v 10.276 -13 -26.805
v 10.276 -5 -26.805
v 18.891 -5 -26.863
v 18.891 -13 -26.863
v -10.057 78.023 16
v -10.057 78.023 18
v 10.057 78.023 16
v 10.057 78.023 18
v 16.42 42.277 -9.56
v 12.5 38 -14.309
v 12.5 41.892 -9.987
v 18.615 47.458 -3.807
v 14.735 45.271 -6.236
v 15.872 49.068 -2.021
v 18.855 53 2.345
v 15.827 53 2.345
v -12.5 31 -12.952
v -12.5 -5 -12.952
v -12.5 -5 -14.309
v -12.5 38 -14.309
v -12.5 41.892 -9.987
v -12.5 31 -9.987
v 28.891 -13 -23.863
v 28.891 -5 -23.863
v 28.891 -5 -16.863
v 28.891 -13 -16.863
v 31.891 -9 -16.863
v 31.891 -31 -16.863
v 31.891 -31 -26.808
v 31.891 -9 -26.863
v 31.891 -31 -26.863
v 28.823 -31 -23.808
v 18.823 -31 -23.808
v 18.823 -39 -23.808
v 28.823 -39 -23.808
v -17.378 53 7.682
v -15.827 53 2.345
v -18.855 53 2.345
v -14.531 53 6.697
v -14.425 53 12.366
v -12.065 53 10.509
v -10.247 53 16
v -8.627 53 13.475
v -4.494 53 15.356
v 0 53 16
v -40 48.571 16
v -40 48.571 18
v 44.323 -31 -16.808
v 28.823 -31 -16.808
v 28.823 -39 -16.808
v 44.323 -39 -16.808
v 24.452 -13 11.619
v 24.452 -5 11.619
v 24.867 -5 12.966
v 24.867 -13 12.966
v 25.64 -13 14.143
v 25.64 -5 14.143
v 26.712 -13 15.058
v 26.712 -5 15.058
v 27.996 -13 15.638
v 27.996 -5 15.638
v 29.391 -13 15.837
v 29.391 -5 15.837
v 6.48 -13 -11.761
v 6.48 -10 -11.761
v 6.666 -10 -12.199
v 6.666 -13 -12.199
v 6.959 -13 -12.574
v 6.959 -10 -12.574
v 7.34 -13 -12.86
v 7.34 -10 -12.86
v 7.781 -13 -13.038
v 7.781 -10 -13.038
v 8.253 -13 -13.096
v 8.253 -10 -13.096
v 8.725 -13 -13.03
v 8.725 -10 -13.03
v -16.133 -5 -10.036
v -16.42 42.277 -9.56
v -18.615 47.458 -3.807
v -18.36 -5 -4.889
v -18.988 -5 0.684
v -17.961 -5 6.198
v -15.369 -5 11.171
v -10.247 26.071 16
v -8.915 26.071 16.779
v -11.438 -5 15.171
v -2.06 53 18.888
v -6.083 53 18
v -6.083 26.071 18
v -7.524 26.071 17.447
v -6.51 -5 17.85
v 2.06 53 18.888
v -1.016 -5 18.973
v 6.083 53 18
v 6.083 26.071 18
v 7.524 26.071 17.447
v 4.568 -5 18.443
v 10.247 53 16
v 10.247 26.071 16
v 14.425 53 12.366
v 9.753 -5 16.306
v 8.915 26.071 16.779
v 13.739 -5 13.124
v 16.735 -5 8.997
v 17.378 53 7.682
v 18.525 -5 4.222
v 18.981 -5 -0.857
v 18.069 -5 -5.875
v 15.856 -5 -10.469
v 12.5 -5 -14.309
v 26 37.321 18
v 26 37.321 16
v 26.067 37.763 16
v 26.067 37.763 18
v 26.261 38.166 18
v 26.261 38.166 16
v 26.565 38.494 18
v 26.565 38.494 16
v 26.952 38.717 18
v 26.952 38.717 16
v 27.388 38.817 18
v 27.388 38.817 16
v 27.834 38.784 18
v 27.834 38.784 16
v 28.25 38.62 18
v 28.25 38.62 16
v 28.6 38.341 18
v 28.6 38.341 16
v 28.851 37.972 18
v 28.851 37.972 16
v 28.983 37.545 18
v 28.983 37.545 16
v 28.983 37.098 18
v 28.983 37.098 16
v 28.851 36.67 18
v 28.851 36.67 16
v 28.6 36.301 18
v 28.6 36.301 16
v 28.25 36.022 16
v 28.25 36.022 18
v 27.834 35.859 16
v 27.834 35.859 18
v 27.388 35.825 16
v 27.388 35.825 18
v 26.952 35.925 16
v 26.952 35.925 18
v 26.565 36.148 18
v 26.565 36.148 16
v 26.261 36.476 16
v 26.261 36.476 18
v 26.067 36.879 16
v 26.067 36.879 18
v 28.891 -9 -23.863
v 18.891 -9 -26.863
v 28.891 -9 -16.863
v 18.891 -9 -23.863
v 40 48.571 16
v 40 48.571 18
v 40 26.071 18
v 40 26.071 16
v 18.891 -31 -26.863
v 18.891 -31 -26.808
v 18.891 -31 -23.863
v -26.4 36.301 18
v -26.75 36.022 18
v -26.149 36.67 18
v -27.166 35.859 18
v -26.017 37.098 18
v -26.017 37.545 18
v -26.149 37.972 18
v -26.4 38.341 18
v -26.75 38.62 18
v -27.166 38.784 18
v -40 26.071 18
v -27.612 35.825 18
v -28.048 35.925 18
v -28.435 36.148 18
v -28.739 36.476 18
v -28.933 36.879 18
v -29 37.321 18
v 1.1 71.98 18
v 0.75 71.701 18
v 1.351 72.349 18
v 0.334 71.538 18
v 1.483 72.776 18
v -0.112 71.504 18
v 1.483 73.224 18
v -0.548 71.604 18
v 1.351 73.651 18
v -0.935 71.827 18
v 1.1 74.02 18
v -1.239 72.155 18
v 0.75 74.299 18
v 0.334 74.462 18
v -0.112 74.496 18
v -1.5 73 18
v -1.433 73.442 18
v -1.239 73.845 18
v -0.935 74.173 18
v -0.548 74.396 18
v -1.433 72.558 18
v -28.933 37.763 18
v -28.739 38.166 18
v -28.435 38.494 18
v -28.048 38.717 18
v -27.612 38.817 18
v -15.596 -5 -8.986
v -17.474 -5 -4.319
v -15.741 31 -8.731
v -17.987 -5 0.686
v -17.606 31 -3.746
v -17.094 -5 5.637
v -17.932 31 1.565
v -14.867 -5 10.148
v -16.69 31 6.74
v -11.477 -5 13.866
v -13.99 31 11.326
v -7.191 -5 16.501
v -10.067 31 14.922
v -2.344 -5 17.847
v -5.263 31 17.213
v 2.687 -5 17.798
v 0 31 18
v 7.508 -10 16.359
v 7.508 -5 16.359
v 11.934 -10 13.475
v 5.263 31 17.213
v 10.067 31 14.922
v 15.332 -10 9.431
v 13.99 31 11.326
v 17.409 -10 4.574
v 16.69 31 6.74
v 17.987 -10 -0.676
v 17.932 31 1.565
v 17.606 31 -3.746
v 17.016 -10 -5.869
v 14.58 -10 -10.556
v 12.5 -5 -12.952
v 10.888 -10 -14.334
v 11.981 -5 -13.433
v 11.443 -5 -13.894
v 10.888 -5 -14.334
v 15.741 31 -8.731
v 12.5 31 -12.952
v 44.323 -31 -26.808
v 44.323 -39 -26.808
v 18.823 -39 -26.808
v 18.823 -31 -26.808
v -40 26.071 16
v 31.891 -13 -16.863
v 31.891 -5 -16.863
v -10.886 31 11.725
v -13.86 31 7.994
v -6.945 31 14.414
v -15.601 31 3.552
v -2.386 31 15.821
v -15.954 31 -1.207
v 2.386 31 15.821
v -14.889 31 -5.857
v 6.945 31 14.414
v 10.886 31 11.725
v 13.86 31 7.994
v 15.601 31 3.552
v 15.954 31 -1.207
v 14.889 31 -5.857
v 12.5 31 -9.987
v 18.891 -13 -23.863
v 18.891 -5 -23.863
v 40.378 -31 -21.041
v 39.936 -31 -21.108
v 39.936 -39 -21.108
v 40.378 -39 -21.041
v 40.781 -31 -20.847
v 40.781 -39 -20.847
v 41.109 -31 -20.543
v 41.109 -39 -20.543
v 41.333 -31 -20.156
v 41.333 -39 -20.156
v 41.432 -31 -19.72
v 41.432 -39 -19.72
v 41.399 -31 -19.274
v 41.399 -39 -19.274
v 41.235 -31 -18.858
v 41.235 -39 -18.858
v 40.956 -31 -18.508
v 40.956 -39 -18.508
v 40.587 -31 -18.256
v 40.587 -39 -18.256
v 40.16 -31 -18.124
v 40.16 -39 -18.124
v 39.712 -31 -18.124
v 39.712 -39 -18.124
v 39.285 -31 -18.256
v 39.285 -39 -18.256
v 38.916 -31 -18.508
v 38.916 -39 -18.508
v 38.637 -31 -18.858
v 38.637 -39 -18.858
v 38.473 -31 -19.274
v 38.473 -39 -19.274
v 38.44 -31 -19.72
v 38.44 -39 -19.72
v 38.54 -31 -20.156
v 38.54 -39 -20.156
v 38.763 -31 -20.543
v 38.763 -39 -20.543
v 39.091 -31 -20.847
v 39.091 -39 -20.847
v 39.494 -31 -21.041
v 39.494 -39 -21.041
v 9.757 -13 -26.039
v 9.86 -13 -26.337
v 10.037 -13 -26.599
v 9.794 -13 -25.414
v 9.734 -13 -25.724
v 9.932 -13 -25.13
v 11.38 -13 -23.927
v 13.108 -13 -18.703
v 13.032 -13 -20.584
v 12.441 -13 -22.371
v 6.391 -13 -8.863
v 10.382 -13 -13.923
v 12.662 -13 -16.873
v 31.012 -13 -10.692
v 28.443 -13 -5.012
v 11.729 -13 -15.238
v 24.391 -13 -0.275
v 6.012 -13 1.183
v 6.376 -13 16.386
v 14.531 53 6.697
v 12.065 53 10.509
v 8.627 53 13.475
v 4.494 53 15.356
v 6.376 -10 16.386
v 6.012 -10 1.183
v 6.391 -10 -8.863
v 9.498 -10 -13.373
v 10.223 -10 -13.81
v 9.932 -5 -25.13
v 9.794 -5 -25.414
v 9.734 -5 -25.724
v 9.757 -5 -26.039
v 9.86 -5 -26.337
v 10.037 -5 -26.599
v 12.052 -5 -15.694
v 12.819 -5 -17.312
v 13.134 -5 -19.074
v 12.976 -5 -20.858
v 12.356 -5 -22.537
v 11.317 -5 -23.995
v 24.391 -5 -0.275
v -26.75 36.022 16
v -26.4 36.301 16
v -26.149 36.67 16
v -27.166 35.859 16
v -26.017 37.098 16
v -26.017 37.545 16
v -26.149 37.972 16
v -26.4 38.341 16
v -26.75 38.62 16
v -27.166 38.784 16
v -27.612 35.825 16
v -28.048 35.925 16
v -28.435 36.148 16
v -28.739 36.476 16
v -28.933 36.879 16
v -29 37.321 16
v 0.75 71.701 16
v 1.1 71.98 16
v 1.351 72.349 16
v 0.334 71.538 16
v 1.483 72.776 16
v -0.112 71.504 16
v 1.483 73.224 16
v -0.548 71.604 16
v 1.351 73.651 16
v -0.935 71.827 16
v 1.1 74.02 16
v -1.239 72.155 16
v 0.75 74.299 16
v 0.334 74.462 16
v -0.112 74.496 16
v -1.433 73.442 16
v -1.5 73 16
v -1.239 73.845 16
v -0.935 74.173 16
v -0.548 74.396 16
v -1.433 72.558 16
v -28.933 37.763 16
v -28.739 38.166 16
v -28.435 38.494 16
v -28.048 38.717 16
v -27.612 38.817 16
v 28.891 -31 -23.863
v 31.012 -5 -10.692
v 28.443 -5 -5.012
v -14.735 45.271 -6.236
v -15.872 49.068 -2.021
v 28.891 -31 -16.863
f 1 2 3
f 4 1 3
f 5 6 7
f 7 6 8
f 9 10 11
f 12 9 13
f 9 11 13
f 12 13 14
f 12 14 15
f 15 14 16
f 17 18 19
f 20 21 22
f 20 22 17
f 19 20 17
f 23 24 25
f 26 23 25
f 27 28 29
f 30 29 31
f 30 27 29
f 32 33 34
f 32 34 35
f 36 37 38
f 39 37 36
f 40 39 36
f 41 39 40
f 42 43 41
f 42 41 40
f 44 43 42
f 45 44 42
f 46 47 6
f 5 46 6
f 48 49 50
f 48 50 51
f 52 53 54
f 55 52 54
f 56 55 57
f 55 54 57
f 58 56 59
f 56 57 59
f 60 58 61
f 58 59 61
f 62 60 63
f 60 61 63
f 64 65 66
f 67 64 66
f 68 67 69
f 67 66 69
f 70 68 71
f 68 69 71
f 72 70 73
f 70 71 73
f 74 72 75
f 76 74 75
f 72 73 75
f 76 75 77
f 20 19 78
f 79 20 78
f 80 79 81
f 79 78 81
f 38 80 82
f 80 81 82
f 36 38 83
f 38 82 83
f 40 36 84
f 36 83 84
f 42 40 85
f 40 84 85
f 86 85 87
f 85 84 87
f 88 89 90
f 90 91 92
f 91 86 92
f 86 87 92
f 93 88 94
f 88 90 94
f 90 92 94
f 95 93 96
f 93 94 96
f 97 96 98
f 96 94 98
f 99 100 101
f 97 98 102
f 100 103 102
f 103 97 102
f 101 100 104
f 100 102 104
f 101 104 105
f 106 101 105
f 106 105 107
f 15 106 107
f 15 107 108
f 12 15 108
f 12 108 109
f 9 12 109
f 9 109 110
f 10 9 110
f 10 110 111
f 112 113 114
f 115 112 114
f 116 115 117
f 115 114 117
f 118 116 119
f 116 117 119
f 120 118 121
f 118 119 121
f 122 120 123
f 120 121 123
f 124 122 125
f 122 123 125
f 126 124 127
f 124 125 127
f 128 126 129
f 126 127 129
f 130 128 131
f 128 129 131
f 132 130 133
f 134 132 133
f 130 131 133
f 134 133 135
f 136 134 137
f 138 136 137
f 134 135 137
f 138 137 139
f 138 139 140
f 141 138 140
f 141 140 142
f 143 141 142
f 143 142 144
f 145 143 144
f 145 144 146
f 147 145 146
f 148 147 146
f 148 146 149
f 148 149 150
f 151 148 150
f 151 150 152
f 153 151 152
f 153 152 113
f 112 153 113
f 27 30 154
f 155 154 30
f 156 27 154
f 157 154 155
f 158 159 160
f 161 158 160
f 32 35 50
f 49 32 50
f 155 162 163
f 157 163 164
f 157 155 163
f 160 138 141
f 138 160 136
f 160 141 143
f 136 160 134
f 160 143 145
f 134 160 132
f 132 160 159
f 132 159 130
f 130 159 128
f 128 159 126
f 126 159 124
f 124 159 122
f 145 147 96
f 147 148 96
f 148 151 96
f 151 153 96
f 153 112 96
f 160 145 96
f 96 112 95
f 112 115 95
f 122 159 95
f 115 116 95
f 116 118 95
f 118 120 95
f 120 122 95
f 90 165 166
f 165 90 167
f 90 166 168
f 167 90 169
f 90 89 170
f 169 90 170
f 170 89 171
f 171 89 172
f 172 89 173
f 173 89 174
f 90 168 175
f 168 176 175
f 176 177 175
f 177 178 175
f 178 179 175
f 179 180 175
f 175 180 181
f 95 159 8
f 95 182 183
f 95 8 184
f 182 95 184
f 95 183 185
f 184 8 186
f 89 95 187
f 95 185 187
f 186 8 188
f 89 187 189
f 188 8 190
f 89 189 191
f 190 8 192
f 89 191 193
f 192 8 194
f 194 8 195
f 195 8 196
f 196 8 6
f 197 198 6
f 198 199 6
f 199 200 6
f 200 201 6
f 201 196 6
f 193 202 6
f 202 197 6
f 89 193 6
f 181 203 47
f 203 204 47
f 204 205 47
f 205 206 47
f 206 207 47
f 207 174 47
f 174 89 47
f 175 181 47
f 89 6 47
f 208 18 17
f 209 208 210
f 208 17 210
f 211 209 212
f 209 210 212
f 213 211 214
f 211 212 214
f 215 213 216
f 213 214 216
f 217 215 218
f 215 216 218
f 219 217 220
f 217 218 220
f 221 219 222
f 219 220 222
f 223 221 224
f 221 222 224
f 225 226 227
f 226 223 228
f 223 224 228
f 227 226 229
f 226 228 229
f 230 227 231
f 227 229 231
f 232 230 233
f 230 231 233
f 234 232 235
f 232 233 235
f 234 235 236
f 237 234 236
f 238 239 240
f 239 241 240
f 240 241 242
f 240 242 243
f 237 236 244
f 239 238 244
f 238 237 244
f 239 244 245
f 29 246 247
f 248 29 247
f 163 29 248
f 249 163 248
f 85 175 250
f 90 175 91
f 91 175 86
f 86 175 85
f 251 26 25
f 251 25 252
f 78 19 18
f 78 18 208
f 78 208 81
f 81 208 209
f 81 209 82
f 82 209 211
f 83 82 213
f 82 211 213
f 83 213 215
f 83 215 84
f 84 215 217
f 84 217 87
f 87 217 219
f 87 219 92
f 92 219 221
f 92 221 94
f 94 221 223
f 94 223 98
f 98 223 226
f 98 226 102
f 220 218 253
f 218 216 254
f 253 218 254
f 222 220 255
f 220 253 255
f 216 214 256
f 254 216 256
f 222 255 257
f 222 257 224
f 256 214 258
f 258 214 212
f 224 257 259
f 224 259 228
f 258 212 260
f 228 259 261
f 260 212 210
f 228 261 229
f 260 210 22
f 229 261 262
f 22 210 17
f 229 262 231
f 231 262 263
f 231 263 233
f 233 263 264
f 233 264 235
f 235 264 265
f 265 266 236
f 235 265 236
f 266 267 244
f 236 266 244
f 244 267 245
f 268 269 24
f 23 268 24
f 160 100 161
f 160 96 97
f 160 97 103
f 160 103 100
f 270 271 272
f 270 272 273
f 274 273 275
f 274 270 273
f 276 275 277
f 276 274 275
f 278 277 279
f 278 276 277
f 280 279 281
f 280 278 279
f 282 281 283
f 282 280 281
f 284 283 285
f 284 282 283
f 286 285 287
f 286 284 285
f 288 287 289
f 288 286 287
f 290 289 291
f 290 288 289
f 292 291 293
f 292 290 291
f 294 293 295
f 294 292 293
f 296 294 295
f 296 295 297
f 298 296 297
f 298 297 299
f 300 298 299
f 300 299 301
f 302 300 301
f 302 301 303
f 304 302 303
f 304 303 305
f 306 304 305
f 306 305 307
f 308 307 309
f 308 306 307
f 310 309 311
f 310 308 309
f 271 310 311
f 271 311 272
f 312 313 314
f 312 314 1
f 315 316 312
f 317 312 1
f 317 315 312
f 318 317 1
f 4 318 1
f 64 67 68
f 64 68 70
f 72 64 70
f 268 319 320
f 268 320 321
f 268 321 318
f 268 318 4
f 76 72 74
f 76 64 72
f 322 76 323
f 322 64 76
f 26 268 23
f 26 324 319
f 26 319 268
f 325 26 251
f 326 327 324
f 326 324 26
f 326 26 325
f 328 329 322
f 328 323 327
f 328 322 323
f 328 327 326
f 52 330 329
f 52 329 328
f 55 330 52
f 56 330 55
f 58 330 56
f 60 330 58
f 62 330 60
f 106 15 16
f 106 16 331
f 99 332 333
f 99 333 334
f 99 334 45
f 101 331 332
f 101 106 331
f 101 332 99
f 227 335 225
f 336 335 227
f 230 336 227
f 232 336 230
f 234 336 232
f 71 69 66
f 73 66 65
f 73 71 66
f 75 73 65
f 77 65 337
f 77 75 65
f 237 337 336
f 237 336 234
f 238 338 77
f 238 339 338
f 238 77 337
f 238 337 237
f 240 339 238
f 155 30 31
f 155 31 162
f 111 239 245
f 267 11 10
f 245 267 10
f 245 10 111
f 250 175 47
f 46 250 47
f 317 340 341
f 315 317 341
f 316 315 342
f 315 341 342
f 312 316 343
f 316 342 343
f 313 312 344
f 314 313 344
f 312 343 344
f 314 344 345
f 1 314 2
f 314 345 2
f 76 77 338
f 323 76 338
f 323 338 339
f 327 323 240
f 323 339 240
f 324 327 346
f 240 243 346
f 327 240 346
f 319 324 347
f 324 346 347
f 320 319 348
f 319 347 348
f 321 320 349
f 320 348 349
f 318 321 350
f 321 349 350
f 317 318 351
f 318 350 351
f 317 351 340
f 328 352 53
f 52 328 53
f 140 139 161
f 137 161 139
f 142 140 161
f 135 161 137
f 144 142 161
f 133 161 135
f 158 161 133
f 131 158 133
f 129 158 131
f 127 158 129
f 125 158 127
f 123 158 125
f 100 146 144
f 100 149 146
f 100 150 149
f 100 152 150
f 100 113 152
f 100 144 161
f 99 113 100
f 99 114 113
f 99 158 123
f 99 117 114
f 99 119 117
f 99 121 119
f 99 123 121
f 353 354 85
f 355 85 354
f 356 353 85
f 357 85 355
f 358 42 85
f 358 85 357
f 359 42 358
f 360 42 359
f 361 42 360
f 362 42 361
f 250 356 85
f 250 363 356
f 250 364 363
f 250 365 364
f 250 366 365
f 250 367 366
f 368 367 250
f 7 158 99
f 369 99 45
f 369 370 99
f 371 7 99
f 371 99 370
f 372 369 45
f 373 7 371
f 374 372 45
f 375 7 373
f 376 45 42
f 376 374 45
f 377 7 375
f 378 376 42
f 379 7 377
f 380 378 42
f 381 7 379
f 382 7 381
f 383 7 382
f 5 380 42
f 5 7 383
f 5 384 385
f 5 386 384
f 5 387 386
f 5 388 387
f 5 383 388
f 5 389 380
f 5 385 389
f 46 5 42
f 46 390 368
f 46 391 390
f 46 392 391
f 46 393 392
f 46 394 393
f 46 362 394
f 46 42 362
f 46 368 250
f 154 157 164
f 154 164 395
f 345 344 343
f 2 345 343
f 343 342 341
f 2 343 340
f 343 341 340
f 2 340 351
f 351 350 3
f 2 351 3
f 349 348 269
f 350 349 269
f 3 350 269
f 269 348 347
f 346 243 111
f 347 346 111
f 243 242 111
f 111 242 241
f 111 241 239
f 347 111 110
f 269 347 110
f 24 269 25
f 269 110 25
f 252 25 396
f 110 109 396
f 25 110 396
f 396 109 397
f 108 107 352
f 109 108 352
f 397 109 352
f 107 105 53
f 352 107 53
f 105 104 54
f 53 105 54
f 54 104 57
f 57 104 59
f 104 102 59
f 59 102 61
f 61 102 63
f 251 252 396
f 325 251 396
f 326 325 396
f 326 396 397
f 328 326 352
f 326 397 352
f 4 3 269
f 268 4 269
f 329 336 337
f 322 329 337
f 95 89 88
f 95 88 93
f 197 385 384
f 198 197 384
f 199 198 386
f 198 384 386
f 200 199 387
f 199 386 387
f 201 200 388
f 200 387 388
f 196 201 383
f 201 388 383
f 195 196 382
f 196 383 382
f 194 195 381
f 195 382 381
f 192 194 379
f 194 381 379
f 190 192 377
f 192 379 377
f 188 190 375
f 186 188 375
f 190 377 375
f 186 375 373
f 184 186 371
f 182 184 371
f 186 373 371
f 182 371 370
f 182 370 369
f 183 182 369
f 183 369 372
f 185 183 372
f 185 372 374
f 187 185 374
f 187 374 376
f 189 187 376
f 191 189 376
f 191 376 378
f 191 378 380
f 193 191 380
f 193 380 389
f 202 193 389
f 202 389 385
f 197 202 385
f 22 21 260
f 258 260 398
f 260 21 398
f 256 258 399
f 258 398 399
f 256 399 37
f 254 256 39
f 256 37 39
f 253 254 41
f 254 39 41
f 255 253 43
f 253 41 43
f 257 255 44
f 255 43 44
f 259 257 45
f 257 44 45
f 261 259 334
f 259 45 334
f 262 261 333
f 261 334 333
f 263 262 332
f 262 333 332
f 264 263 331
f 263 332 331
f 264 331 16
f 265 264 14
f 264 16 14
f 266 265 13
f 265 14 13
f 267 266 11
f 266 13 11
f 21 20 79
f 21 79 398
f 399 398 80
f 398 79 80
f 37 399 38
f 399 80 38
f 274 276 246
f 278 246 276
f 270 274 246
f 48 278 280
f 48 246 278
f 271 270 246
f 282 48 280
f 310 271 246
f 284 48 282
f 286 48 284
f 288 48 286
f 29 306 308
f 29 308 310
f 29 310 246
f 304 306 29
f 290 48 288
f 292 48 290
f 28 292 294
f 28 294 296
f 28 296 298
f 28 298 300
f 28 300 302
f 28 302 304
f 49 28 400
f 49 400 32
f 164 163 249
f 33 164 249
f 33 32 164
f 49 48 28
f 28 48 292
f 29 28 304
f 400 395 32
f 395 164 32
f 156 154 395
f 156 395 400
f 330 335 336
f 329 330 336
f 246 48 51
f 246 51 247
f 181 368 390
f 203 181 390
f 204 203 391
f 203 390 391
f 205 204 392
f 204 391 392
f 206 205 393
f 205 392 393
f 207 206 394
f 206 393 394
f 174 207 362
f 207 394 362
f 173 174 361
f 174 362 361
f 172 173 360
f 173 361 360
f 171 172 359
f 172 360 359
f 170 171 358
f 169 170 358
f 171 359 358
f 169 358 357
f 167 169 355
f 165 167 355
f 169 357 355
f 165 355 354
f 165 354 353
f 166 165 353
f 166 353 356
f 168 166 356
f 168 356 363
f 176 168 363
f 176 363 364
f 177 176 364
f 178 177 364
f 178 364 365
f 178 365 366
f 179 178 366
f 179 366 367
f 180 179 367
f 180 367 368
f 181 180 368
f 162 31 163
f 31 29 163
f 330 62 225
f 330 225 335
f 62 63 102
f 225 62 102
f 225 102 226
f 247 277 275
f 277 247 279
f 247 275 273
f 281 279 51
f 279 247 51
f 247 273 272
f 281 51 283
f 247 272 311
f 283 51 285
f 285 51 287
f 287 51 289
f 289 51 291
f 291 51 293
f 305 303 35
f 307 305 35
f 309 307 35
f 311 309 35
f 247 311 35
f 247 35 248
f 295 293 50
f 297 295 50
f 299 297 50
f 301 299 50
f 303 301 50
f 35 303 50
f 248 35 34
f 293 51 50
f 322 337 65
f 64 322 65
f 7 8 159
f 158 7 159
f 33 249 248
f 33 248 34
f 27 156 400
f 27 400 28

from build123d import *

# Parameters (mm, degrees)
BOSS_EXTRUDE1_DEPTH      = 53
BOSS_EXTRUDE1_DEPTH_BACK = 5
SKETCH1_R                = 19
SKETCH2_R                = 16
CUT_EXTRUDE1_DEPTH       = 22
SKETCH3_W                = 25
SKETCH3_H                = 20
CUT_EXTRUDE2_DEPTH       = 108
CUT_EXTRUDE3_DEPTH       = 108
CUT_EXTRUDE3_DEPTH_BACK  = 108
BOSS_EXTRUDE2_DEPTH      = 2
SKETCH10_R               = 1.5
CUT_EXTRUDE4_DEPTH       = 16
BOSS_EXTRUDE3_DEPTH      = 8
BOSS_EXTRUDE5_DEPTH      = 18
BOSS_EXTRUDE5_DEPTH_BACK = 4
SKETCH13_R               = 1.500172947
BOSS_EXTRUDE6_DEPTH      = 8
SKETCH16_R               = 18
CUT_EXTRUDE5_DEPTH       = 41


with BuildPart() as part:
    # Sketch1 → Boss-Extrude1 (new, two sides: drawn at the far end of the back side and taken through both)
    with BuildSketch(Plane(origin=(0, 0, 0), x_dir=(1, 0, 0), z_dir=(0, 1, 0)).offset(-BOSS_EXTRUDE1_DEPTH_BACK)):
        with Locations(Location((0, 0, 0), (0, 0, 270))):
            Circle(SKETCH1_R)
    extrude(amount=BOSS_EXTRUDE1_DEPTH + BOSS_EXTRUDE1_DEPTH_BACK)

    # Sketch2 → Cut-Extrude1 (cut)
    with BuildSketch(Plane(origin=(0, 53, 0), x_dir=(1, 0, 0), z_dir=(0, 1, 0))):
        with Locations(Location((0, 0, 0), (0, 0, 270))):
            Circle(SKETCH2_R)
    extrude(amount=-CUT_EXTRUDE1_DEPTH, mode=Mode.SUBTRACT)

    # Sketch3 → Cut-Extrude2 (cut)
    with BuildSketch(Plane(origin=(0, 53, 0), x_dir=(1, 0, 0), z_dir=(0, 1, 0))):
        with Locations((0, 16)):
            Rectangle(SKETCH3_W, SKETCH3_H)
    extrude(amount=-CUT_EXTRUDE2_DEPTH, mode=Mode.SUBTRACT)

    # Sketch7 → Cut-Extrude3 (cut, two sides: drawn at the far end of the back side and taken through both)
    with BuildSketch(Plane(origin=(0, 0, 0), x_dir=(0, 0, -1), z_dir=(1, 0, 0)).offset(-CUT_EXTRUDE3_DEPTH_BACK)):
        Polygon((14.309088021, 53), (14.309088021, 38), (-2.345455989, 53), align=None)
    extrude(amount=CUT_EXTRUDE3_DEPTH + CUT_EXTRUDE3_DEPTH_BACK, mode=Mode.SUBTRACT)

    # Sketch8 → Boss-Extrude2 (add)
    with BuildSketch(Plane.XY.offset(18)):
        Polygon((10.05709572, 78.023156751), (40, 48.571119754), (40, 26.071119754), (0, 26.071119754), (-40, 26.071119754), (-40, 48.571119754), (-10.05709572, 78.023156751), align=None)
    extrude(amount=-BOSS_EXTRUDE2_DEPTH)

    # Sketch10 → Cut-Extrude4 (cut)
    with BuildSketch(Plane(origin=(0, 0, 16), x_dir=(-1, 0, 0), z_dir=(0, 0, -1))):
        with Locations((-27.5, 37.321119754)):
            Circle(SKETCH10_R)
        with Locations((27.5, 37.321119754)):
            Circle(SKETCH10_R)
        with Locations((0, 73)):
            Circle(SKETCH10_R)
    extrude(amount=-CUT_EXTRUDE4_DEPTH, mode=Mode.SUBTRACT)

    # Sketch11 → Boss-Extrude3 (add)
    with BuildSketch(Plane.XZ.offset(5)):
        with BuildLine():
            Line((10.275891909, -26.805431868), (18.890882144, -26.863380934))
            Line((18.890882144, -26.863380934), (18.890882144, -23.863377119))
            Line((18.890882144, -23.863377119), (28.890882144, -23.863377119))
            Line((28.890882144, -23.863377119), (28.890882144, -16.863377119))
            Line((28.890882144, -16.863377119), (31.890882144, -16.863377119))
            ThreePointArc((31.890882144, -16.863377119), (29.928759086, -7.76088478), (24.390882144, -0.275084044))
            Line((24.390882144, -0.275084044), (24.452405581, 11.618795847))
            ThreePointArc((24.452405581, 11.618795847), (26.143620347, 14.638664645), (29.390882144, 15.836623644))
            Line((29.390882144, 15.836623644), (6.375618396, 16.386397999))
            Line((6.375618396, 16.386397999), (6.012446141, 1.182878311))
            Line((6.012446141, 1.182878311), (6.390882144, -8.863379027))
            Line((6.390882144, -8.863379027), (6.480237612, -11.760990645))
            ThreePointArc((6.480237612, -11.760990645), (7.33967567, -12.860163004), (8.724622378, -13.029680754))
            ThreePointArc((8.724622378, -13.029680754), (13.107641391, -18.70255332), (9.931897769, -25.129604841))
            ThreePointArc((9.931897769, -25.129604841), (9.756819698, -26.038761874), (10.275891909, -26.805431868))
        make_face()
    extrude(amount=BOSS_EXTRUDE3_DEPTH)

    # Sketch16 → Cut-Extrude5 (cut)
    with BuildSketch(Plane(origin=(0, 31, 0), x_dir=(1, 0, 0), z_dir=(0, 1, 0))):
        Circle(SKETCH16_R)
    extrude(amount=-CUT_EXTRUDE5_DEPTH, mode=Mode.SUBTRACT)


with BuildPart() as body_2:
    # Sketch12 → Boss-Extrude5 (new, two sides: drawn at the far end of the back side and taken through both)
    with BuildSketch(Plane.XZ.offset(13).offset(-BOSS_EXTRUDE5_DEPTH_BACK)):
        Polygon((18.890882144, -26.863380934), (18.890882144, -23.863377119), (28.890882144, -23.863377119), (28.890882144, -16.863377119), (31.890882144, -16.863377119), (31.890882144, -26.863380934), align=None)
    extrude(amount=BOSS_EXTRUDE5_DEPTH + BOSS_EXTRUDE5_DEPTH_BACK)

    # Sketch13 → Boss-Extrude6 (add)
    with BuildSketch(Plane.XZ.offset(31)):
        Polygon((18.822698898, -26.807587047), (18.822698898, -23.807583233), (28.822698898, -23.807583233), (28.822698898, -16.807583233), (44.322698898, -16.807583233), (44.322698898, -26.807587047), align=None)
        with Locations(Location((39.936045011, -19.607691517, 0), (0, 0, 270))):
            Circle(SKETCH13_R, mode=Mode.SUBTRACT)
    extrude(amount=BOSS_EXTRUDE6_DEPTH)


solid = Compound([part.part, body_2.part])
